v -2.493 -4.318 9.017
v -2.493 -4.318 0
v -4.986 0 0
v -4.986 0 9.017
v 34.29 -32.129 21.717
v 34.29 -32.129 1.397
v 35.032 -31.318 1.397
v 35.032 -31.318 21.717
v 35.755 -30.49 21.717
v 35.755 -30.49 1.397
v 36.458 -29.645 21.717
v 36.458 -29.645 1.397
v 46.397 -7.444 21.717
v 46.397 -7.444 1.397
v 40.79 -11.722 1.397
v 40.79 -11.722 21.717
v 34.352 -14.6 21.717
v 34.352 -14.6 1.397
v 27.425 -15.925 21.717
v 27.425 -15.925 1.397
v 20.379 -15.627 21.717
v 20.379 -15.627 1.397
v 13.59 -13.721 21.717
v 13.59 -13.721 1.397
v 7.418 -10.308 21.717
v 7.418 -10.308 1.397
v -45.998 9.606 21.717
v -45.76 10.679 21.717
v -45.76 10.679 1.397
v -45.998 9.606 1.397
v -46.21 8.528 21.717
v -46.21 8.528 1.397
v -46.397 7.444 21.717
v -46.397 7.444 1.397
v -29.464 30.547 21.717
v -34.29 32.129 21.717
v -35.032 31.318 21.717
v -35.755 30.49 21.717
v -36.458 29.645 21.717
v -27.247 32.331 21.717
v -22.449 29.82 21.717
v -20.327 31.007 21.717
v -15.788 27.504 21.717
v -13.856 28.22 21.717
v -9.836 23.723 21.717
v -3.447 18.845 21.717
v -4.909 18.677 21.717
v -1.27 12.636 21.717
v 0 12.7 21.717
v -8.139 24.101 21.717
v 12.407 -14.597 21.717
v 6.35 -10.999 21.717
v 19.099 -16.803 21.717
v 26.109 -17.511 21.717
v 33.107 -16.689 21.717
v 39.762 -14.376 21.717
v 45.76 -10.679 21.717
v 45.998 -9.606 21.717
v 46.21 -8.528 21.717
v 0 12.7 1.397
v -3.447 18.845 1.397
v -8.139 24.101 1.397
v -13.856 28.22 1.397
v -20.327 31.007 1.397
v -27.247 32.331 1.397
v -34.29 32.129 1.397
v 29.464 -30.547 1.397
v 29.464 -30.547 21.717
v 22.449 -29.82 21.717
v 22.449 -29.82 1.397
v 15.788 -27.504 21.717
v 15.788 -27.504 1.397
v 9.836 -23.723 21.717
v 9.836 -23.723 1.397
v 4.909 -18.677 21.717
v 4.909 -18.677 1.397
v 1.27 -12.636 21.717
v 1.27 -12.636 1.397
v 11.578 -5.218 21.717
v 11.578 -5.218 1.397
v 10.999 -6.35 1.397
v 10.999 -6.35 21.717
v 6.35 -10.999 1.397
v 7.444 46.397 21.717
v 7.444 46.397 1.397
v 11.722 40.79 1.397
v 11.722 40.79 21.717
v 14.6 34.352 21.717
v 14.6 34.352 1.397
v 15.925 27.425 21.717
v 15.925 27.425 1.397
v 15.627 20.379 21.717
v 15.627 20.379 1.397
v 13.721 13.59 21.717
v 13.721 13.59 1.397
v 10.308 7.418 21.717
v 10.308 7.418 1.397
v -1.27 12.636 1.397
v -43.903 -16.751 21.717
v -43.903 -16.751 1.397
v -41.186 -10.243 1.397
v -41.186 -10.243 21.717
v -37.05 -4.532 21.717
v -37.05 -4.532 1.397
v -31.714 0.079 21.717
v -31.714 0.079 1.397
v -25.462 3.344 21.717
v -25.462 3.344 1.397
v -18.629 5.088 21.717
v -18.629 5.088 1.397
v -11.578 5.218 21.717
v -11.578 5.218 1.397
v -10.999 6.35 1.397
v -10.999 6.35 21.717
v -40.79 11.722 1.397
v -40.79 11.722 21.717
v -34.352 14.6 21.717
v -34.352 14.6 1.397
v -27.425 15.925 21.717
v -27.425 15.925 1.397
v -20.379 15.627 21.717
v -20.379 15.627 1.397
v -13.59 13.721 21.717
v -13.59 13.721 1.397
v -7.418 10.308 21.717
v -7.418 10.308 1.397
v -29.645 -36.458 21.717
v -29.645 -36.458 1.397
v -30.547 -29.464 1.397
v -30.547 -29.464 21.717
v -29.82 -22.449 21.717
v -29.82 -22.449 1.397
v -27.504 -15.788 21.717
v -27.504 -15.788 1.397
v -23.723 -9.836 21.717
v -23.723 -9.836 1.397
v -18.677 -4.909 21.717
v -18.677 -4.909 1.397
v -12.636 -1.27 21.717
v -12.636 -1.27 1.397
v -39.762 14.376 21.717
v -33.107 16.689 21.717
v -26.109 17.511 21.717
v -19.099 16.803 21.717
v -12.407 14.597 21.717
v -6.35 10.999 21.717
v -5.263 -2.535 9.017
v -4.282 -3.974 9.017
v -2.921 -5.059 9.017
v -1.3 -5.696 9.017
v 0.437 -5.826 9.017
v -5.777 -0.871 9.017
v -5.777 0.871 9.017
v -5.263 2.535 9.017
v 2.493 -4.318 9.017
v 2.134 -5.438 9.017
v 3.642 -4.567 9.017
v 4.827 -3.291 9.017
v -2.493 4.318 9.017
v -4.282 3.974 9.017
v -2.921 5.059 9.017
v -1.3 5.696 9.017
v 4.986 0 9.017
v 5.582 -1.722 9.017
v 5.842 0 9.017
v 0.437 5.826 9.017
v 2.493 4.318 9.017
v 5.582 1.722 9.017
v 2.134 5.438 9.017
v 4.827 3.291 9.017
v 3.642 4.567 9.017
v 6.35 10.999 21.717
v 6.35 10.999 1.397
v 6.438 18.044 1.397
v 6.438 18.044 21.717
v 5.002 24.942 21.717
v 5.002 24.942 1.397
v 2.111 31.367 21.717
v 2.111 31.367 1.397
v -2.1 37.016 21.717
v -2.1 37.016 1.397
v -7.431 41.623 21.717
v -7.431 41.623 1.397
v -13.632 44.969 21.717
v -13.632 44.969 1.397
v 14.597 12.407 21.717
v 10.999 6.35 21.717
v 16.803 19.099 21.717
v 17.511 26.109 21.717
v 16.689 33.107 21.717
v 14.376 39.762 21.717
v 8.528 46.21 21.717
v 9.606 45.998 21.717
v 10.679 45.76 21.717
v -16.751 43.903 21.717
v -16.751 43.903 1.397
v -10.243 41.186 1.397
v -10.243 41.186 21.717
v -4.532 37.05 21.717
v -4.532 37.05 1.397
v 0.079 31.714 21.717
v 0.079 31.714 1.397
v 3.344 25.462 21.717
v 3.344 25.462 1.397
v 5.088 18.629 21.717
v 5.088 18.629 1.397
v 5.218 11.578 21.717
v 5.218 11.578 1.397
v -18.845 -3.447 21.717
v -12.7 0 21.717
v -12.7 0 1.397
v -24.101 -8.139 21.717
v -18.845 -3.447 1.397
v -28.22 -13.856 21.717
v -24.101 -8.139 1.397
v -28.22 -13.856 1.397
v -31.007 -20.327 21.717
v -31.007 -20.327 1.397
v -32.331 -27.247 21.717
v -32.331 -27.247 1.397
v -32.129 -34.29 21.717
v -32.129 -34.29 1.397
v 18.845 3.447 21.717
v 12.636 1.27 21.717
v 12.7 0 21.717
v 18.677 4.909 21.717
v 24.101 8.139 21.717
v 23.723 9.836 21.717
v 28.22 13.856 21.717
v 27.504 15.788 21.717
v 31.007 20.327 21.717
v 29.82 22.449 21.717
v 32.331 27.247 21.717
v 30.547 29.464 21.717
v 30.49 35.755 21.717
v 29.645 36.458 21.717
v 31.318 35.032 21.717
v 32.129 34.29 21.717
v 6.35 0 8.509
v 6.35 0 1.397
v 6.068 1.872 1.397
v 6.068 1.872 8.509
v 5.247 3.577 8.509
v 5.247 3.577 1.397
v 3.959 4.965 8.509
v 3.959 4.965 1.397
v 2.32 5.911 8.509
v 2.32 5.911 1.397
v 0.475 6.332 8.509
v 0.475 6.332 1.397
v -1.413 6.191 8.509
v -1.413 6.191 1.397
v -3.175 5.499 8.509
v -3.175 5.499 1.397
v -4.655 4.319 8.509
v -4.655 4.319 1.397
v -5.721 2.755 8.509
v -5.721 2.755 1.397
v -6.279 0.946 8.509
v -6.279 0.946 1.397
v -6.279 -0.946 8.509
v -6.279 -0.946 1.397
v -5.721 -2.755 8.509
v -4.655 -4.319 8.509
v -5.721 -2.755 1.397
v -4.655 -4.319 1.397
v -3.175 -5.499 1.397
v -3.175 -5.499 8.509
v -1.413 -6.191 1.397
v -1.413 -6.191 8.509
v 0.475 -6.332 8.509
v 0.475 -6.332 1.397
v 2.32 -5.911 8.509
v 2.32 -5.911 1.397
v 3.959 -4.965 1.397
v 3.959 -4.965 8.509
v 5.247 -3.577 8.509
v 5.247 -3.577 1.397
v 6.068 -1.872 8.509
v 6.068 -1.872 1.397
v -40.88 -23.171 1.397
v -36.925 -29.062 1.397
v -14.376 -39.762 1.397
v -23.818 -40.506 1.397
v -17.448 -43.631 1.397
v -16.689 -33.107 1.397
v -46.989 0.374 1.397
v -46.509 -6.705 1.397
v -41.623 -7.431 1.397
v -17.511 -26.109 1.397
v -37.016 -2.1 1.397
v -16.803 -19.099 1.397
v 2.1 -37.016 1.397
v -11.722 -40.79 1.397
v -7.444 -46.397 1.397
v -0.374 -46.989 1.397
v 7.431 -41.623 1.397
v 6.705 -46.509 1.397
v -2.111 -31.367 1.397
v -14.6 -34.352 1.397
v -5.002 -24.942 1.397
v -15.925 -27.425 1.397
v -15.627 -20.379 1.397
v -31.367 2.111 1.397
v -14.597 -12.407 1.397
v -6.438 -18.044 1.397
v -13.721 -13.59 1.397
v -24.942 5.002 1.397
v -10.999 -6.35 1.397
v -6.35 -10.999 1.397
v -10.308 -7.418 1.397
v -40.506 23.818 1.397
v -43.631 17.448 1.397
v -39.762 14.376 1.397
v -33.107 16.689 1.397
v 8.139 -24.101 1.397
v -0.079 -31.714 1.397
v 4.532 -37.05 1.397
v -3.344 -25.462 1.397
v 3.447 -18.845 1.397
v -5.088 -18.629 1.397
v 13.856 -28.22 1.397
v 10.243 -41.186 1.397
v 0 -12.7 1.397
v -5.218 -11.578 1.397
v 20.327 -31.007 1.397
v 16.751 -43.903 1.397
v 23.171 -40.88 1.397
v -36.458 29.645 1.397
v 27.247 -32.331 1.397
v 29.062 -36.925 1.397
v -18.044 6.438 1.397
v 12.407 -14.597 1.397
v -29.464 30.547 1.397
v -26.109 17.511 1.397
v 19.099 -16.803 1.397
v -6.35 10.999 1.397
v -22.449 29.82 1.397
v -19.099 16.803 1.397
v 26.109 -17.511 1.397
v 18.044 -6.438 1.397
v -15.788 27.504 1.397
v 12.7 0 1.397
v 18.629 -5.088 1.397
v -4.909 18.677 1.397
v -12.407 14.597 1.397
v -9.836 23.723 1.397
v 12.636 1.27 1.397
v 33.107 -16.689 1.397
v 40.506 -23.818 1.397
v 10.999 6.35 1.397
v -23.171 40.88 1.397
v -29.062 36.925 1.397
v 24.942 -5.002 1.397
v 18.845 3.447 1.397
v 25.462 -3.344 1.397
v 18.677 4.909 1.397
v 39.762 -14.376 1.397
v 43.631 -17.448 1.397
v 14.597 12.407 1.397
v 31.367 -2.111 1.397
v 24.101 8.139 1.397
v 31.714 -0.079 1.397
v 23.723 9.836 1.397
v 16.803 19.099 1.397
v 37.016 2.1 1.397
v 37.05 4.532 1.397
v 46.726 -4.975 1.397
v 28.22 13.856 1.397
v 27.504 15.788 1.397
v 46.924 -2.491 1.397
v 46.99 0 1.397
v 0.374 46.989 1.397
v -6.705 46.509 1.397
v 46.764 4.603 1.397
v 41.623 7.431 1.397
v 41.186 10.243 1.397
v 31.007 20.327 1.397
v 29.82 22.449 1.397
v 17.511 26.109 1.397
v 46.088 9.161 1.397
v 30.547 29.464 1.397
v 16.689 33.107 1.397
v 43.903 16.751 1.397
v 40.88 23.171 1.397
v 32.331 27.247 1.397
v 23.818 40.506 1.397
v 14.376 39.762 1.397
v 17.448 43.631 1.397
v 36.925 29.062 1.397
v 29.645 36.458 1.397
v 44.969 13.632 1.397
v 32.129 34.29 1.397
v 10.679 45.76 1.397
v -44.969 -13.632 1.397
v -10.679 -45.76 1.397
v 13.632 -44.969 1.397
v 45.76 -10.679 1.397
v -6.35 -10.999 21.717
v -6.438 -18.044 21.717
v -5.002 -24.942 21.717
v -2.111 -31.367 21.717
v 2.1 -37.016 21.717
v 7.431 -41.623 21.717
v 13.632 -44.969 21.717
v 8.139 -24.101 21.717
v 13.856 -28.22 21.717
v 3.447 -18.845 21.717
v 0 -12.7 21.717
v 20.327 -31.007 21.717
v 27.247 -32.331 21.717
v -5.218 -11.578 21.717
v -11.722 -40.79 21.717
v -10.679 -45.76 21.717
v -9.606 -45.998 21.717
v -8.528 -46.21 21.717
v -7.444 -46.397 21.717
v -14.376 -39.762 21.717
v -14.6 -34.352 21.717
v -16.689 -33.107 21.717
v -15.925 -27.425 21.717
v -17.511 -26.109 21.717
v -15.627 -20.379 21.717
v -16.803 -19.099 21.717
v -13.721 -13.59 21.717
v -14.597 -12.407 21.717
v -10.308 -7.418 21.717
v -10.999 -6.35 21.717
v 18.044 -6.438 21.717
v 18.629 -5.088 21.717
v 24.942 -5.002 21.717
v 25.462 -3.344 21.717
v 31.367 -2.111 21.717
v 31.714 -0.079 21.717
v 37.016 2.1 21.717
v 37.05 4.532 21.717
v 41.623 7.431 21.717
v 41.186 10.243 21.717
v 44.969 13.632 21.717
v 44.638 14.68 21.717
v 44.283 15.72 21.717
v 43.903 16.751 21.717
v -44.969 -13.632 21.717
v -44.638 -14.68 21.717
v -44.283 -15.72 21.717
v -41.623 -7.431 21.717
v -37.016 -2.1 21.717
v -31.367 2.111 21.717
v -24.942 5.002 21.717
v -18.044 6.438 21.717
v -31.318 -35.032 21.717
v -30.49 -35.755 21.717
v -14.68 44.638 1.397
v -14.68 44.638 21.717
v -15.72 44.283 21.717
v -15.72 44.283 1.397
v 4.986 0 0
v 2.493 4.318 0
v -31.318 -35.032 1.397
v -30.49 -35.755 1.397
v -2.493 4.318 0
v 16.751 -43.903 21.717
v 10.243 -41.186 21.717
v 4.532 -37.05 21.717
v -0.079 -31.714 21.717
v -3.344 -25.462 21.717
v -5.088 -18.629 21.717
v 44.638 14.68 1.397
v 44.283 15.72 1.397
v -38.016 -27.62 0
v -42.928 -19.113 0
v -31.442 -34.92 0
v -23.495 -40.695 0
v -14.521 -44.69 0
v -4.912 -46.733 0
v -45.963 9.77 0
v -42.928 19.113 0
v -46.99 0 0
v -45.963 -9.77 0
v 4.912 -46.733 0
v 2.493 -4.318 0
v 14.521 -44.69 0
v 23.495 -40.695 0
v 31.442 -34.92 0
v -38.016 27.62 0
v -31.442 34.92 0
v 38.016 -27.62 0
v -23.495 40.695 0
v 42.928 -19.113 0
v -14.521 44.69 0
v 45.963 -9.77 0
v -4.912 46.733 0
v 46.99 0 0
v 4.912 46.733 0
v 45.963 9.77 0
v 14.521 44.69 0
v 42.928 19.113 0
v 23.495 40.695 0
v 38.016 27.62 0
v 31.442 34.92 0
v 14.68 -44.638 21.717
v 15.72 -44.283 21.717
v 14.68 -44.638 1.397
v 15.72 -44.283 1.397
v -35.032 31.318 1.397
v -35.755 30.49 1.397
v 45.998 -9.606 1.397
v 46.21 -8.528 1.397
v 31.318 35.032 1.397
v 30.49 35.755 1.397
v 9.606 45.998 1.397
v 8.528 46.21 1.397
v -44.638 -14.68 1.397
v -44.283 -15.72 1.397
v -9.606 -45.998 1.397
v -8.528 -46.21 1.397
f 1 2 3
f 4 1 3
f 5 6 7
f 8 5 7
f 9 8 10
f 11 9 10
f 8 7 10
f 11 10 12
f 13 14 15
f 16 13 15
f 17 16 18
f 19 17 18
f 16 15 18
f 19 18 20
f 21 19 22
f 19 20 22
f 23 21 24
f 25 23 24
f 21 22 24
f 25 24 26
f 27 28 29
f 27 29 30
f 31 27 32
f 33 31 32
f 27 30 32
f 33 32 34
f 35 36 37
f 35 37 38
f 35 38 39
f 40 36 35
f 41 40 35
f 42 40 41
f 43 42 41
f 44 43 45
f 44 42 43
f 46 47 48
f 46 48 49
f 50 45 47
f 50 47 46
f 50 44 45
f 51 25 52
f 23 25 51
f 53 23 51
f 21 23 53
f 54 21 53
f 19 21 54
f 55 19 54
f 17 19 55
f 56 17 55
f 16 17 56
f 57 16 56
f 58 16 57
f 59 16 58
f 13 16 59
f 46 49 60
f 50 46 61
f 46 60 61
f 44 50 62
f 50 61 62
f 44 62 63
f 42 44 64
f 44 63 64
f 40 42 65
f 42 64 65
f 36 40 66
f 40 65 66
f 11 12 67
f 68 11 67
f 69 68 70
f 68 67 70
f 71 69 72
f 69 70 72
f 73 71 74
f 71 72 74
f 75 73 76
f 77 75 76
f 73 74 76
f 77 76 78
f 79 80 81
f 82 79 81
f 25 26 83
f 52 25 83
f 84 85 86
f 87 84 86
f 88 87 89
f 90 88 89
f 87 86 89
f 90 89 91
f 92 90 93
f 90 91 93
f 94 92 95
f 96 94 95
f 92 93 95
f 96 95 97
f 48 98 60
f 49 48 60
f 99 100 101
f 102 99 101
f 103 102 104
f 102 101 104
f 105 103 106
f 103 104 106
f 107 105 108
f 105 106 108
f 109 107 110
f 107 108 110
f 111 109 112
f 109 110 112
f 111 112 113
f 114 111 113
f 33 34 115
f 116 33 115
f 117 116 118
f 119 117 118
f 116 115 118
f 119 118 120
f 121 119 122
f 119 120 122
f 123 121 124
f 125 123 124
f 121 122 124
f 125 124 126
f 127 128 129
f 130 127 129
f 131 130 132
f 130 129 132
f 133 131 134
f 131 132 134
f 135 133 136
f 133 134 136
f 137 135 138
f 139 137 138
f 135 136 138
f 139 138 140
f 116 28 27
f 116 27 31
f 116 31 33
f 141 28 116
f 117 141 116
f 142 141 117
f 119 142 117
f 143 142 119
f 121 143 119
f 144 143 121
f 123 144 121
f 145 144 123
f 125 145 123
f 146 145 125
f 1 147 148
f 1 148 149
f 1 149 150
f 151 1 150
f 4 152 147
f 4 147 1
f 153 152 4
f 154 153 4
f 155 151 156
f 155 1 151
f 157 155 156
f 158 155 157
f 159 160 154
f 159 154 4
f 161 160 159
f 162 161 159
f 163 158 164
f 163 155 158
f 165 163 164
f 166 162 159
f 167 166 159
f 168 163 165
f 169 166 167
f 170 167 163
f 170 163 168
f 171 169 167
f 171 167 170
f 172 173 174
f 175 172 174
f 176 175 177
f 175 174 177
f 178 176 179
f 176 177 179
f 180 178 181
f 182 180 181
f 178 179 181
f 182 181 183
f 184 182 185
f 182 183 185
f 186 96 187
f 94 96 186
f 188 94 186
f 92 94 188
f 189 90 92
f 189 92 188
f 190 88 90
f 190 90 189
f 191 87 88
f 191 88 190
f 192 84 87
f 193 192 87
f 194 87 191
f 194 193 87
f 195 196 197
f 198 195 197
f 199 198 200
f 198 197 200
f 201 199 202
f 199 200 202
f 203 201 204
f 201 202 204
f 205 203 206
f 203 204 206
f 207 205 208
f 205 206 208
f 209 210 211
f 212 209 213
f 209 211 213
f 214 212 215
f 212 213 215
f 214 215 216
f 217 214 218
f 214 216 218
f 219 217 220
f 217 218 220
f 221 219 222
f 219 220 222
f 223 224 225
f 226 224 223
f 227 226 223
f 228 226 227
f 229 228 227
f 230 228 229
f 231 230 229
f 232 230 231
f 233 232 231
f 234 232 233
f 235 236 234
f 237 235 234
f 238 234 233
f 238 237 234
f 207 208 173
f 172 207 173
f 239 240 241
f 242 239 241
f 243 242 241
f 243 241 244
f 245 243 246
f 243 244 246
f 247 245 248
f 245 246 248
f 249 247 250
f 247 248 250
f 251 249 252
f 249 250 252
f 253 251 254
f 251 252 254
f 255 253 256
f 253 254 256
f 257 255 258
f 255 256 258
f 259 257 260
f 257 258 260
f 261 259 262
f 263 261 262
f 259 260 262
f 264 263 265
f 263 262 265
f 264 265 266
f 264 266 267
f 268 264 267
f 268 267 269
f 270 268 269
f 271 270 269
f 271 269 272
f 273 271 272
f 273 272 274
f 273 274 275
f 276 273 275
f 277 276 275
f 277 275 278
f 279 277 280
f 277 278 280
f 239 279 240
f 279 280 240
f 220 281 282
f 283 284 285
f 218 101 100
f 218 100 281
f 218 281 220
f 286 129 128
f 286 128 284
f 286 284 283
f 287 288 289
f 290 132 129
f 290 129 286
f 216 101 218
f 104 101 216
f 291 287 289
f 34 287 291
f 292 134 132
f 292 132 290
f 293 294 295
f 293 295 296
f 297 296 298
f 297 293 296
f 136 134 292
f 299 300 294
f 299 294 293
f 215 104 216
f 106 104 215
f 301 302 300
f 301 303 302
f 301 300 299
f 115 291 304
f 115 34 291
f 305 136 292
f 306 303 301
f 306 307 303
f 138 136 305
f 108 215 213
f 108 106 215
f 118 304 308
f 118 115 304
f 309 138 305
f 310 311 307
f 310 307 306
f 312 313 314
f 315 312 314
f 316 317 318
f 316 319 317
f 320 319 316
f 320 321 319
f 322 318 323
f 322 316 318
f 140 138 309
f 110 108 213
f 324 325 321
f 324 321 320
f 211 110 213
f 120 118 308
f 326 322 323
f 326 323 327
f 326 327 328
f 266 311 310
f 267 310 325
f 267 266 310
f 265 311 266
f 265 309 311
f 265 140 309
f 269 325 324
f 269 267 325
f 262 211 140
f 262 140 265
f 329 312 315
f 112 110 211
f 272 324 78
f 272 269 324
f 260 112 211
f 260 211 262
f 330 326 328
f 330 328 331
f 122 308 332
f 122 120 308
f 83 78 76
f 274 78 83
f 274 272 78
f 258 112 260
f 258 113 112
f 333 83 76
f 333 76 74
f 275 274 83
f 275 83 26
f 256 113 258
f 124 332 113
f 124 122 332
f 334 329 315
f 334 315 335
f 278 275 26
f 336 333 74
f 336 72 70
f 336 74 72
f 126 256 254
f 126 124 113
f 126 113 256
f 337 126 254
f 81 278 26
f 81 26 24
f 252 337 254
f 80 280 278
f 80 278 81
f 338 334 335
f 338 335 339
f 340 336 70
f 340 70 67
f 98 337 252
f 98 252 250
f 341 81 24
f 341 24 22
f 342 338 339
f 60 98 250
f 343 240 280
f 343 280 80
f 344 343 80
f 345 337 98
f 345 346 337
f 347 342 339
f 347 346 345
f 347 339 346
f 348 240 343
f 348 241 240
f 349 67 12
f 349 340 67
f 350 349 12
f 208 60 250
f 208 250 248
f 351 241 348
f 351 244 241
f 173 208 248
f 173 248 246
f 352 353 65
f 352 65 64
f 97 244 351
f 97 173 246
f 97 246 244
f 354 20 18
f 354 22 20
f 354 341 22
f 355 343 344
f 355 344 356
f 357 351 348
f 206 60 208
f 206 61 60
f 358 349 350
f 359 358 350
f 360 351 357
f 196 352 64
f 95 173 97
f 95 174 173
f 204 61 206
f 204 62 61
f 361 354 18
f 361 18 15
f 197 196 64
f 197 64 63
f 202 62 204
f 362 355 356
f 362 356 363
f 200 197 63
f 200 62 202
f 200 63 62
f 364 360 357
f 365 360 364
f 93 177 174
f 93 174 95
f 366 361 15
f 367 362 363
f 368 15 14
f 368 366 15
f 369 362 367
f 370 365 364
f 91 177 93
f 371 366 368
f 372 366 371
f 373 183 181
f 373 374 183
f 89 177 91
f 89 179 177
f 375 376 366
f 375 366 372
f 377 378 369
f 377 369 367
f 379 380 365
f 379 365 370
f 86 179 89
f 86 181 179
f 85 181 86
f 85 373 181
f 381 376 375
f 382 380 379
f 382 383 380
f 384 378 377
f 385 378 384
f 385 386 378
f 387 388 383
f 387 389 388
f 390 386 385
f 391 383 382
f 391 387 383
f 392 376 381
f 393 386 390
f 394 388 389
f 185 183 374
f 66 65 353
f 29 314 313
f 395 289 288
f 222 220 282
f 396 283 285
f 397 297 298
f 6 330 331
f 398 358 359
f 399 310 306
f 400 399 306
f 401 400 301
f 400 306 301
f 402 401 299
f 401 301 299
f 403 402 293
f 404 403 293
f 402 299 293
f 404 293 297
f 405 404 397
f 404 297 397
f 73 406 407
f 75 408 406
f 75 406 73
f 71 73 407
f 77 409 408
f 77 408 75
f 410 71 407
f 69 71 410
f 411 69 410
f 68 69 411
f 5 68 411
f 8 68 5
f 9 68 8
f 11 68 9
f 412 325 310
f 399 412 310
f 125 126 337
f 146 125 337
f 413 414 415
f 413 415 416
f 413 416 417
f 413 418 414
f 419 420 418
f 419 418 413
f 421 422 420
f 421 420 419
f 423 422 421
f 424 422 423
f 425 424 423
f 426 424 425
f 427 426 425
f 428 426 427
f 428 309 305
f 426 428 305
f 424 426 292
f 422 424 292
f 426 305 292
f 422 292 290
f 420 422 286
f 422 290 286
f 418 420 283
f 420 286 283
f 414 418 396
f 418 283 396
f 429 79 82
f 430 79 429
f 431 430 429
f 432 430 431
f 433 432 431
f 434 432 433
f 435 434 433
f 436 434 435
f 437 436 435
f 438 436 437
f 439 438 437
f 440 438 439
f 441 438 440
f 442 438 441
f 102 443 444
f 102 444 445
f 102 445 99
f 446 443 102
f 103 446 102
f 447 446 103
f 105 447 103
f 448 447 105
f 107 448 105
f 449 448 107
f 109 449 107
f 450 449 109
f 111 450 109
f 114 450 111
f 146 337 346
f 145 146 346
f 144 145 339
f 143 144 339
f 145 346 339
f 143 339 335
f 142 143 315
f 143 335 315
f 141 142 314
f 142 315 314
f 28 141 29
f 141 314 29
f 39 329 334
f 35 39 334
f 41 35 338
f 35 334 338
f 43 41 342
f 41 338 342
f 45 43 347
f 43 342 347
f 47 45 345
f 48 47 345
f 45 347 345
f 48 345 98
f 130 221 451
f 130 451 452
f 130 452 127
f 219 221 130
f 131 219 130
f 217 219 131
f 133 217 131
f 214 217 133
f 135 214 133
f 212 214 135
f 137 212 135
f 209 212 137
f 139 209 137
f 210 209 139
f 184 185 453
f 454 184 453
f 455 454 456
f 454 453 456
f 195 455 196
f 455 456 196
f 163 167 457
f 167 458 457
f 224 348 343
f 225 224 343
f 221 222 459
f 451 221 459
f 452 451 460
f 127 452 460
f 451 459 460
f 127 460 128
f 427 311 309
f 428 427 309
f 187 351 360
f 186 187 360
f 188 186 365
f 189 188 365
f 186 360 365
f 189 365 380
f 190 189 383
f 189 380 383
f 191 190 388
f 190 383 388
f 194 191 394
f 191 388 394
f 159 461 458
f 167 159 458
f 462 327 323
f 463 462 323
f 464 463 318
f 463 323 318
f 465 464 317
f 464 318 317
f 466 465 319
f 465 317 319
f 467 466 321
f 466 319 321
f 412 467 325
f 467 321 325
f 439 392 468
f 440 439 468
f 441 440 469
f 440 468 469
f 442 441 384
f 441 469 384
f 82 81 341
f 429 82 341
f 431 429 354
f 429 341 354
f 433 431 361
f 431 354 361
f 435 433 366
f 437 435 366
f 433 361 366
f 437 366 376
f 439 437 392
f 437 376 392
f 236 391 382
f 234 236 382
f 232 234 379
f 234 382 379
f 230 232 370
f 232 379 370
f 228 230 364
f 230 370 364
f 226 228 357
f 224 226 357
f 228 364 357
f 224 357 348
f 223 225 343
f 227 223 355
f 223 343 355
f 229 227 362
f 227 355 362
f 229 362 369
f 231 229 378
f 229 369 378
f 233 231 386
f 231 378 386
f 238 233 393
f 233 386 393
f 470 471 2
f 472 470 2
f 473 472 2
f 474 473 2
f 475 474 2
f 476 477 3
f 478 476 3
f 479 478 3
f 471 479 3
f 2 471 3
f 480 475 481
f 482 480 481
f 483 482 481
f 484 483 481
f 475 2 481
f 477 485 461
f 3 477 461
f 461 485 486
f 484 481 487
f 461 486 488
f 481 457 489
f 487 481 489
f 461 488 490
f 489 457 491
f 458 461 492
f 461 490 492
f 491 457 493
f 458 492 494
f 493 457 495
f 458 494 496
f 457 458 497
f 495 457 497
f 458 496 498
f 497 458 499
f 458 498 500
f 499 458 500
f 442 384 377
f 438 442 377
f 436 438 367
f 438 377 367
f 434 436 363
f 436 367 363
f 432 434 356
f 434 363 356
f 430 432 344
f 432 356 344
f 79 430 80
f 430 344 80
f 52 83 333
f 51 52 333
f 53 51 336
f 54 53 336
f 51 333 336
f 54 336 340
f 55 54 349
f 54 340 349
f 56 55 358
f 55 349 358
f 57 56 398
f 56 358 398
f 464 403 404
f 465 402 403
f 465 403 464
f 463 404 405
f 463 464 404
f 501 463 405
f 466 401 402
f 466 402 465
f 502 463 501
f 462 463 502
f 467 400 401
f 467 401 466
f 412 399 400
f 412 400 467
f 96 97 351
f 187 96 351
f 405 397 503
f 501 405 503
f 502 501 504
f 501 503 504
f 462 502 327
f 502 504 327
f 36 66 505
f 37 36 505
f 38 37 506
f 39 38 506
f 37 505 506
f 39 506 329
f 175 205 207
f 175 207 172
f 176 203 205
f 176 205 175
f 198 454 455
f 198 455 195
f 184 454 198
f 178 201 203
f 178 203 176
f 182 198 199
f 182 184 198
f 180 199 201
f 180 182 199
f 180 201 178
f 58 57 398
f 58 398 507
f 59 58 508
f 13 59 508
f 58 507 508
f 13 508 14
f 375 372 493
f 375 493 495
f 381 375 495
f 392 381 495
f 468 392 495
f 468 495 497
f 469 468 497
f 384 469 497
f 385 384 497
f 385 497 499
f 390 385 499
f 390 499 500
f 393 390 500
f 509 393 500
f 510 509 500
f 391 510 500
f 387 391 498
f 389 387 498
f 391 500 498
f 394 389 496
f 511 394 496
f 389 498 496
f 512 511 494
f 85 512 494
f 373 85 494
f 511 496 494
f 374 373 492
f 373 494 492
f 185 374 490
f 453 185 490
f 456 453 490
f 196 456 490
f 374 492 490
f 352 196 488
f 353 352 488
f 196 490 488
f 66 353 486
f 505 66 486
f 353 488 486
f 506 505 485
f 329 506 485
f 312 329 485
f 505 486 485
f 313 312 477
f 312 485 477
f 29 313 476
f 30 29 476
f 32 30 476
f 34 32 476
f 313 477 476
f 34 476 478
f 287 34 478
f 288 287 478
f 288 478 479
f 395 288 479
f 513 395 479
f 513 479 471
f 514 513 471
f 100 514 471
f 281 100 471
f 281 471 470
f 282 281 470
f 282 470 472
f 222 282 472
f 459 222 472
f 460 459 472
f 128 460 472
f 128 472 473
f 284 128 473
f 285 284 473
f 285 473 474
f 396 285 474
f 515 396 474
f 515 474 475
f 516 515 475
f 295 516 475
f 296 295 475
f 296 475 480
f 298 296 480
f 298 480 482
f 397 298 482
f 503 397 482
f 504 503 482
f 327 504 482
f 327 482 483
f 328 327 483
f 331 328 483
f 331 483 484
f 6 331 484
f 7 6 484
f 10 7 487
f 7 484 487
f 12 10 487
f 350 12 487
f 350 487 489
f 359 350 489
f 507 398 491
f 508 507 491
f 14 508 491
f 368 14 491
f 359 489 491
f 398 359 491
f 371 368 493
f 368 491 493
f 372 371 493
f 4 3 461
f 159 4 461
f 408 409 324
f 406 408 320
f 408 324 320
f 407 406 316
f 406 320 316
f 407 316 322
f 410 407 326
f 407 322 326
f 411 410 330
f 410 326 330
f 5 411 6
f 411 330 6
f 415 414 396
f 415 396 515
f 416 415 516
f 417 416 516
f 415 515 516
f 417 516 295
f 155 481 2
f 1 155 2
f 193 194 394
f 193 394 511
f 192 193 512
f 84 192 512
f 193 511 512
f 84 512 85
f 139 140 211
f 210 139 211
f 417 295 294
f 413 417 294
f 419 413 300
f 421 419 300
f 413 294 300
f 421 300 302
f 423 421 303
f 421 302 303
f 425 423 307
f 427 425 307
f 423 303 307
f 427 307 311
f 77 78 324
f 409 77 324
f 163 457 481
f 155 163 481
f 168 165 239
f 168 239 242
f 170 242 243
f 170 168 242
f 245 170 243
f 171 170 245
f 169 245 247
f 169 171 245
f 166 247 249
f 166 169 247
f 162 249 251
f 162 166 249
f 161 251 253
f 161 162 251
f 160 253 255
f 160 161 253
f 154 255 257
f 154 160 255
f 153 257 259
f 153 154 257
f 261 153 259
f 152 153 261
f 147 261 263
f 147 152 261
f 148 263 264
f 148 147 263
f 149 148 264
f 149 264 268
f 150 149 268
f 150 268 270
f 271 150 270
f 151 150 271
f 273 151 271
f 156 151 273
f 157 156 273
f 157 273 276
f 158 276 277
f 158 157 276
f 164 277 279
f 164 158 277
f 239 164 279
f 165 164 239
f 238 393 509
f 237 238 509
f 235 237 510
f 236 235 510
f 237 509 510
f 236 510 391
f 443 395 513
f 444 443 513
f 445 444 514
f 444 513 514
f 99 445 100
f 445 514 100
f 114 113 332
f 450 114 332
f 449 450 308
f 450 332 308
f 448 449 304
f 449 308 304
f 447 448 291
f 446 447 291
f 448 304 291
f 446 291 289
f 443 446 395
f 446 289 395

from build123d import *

# Parameters (mm, degrees)
F0_R     = 46.99
F1_DEPTH = 1.397
F3_DEPTH = 25.4
F4_R     = 6.35
F5_DEPTH = 7.62
F6_SIZE  = 0.508
F8_DEPTH = 20.32


with BuildPart() as f1:
    # F0 (on Top) → F1 (new body)
    with BuildSketch(Plane.XY):
        Circle(F0_R)
    extrude(amount=F1_DEPTH)

    # F2 (on face) → F3 (cut)
    with BuildSketch(Plane(origin=(0, 0, 0), x_dir=(1, 0, 0), z_dir=(0, 0, -1))):
        Polygon((2.4929984624, 4.318), (-2.4929984624, 4.318), (-4.9859969247, 0), (-2.4929984624, -4.318), (2.4929984624, -4.318), (4.9859969247, 0), align=None)
    extrude(amount=-F3_DEPTH, mode=Mode.SUBTRACT)

    # F4 (on face) → F5 (join)
    with BuildSketch(Plane.XY.offset(1.397)):
        Circle(F4_R)
        Polygon((2.4929984624, 4.318), (4.9859969247, 0), (2.4929984624, -4.318), (-2.4929984624, -4.318), (-4.9859969247, 0), (-2.4929984624, 4.318), align=None, mode=Mode.SUBTRACT)
    extrude(amount=F5_DEPTH)

    # F6
    f6_edges = [f1.edges().sort_by_distance(p)[0] for p in [
        (-6.35, 0, 9.017),
    ]]
    chamfer(f6_edges, length=F6_SIZE)

    # F7 (on face) → F8 (join)
    with BuildSketch(Plane.XY.offset(1.397)):
        with BuildLine():
            ThreePointArc((10.9985226281, 6.35), (17.5112017635, 26.1092350832), (10.6793059213, 45.7603816094))
            ThreePointArc((10.6793059213, 45.7603816094), (9.067413692, 46.1068553356), (7.4443589893, 46.396569046))
            ThreePointArc((7.4443589893, 46.396569046), (15.9253452898, 27.4252340455), (10.3083918417, 7.4180224884))
            Line((10.3083918417, 7.4180224884), (10.9985226281, 6.35))
        make_face()
        with BuildLine():
            ThreePointArc((12.7, 0), (28.2197631195, 13.8556599737), (32.1287410273, 34.29))
            ThreePointArc((32.1287410273, 34.29), (30.9060382717, 35.3960011633), (29.6452885226, 36.4584279476))
            ThreePointArc((29.6452885226, 36.4584279476), (27.5043706077, 15.7882767433), (12.6363404513, 1.27))
            Line((12.6363404513, 1.27), (12.7, 0))
        make_face()
        with BuildLine():
            ThreePointArc((44.9693059213, 13.6316405821), (44.4634148552, 15.2008170639), (43.9027869369, 16.7512805234))
            ThreePointArc((43.9027869369, 16.7512805234), (31.713622033, -0.0791365622), (11.5783918417, -5.2183179628))
            Line((11.5783918417, -5.2183179628), (10.9985226281, -6.35))
            ThreePointArc((10.9985226281, -6.35), (31.3668617372, -2.1105280363), (44.9693059213, 13.6316405821))
        make_face()
        with BuildLine():
            ThreePointArc((45.7603816094, -10.6793059213), (46.1068553356, -9.067413692), (46.396569046, -7.4443589893))
            ThreePointArc((46.396569046, -7.4443589893), (27.4252340455, -15.9253452898), (7.4180224884, -10.3083918417))
            Line((7.4180224884, -10.3083918417), (6.35, -10.9985226281))
            ThreePointArc((6.35, -10.9985226281), (26.1092350832, -17.5112017635), (45.7603816094, -10.6793059213))
        make_face()
        with BuildLine():
            ThreePointArc((34.29, -32.1287410273), (35.3960011633, -30.9060382717), (36.4584279476, -29.6452885226))
            ThreePointArc((36.4584279476, -29.6452885226), (15.7882767433, -27.5043706077), (1.27, -12.6363404513))
            Line((1.27, -12.6363404513), (0, -12.7))
            ThreePointArc((0, -12.7), (13.8556599737, -28.2197631195), (34.29, -32.1287410273))
        make_face()
        with BuildLine():
            ThreePointArc((13.6316405821, -44.9693059213), (15.2008170639, -44.4634148552), (16.7512805234, -43.9027869369))
            ThreePointArc((16.7512805234, -43.9027869369), (-0.0791365622, -31.713622033), (-5.2183179628, -11.5783918417))
            Line((-5.2183179628, -11.5783918417), (-6.35, -10.9985226281))
            ThreePointArc((-6.35, -10.9985226281), (-2.1105280363, -31.3668617372), (13.6316405821, -44.9693059213))
        make_face()
        with BuildLine():
            ThreePointArc((-10.6793059213, -45.7603816094), (-9.067413692, -46.1068553356), (-7.4443589893, -46.396569046))
            ThreePointArc((-7.4443589893, -46.396569046), (-15.9253452898, -27.4252340455), (-10.3083918417, -7.4180224884))
            Line((-10.3083918417, -7.4180224884), (-10.9985226281, -6.35))
            ThreePointArc((-10.9985226281, -6.35), (-17.5112017635, -26.1092350832), (-10.6793059213, -45.7603816094))
        make_face()
        with BuildLine():
            ThreePointArc((-32.1287410273, -34.29), (-30.9060382717, -35.3960011633), (-29.6452885226, -36.4584279476))
            ThreePointArc((-29.6452885226, -36.4584279476), (-27.5043706077, -15.7882767433), (-12.6363404513, -1.27))
            Line((-12.6363404513, -1.27), (-12.7, 0))
            ThreePointArc((-12.7, 0), (-28.2197631195, -13.8556599737), (-32.1287410273, -34.29))
        make_face()
        with BuildLine():
            ThreePointArc((-10.9985226281, 6.35), (-31.3668617372, 2.1105280363), (-44.9693059213, -13.6316405821))
            ThreePointArc((-44.9693059213, -13.6316405821), (-44.4634148552, -15.2008170639), (-43.9027869369, -16.7512805234))
            ThreePointArc((-43.9027869369, -16.7512805234), (-31.713622033, 0.0791365622), (-11.5783918417, 5.2183179628))
            Line((-11.5783918417, 5.2183179628), (-10.9985226281, 6.35))
        make_face()
        with BuildLine():
            ThreePointArc((-6.35, 10.9985226281), (-26.1092350832, 17.5112017635), (-45.7603816094, 10.6793059213))
            ThreePointArc((-45.7603816094, 10.6793059213), (-46.1068553356, 9.067413692), (-46.396569046, 7.4443589893))
            ThreePointArc((-46.396569046, 7.4443589893), (-27.4252340455, 15.9253452898), (-7.4180224884, 10.3083918417))
            Line((-7.4180224884, 10.3083918417), (-6.35, 10.9985226281))
        make_face()
        with BuildLine():
            ThreePointArc((0, 12.7), (-13.8556599737, 28.2197631195), (-34.29, 32.1287410273))
            ThreePointArc((-34.29, 32.1287410273), (-35.3960011633, 30.9060382717), (-36.4584279476, 29.6452885226))
            ThreePointArc((-36.4584279476, 29.6452885226), (-15.7882767433, 27.5043706077), (-1.27, 12.6363404513))
            Line((-1.27, 12.6363404513), (0, 12.7))
        make_face()
        with BuildLine():
            ThreePointArc((6.35, 10.9985226281), (2.1105280363, 31.3668617372), (-13.6316405821, 44.9693059213))
            ThreePointArc((-13.6316405821, 44.9693059213), (-15.2008170639, 44.4634148552), (-16.7512805234, 43.9027869369))
            ThreePointArc((-16.7512805234, 43.9027869369), (0.0791365622, 31.713622033), (5.2183179628, 11.5783918417))
            Line((5.2183179628, 11.5783918417), (6.35, 10.9985226281))
        make_face()
    extrude(amount=F8_DEPTH)


solid = f1.part
